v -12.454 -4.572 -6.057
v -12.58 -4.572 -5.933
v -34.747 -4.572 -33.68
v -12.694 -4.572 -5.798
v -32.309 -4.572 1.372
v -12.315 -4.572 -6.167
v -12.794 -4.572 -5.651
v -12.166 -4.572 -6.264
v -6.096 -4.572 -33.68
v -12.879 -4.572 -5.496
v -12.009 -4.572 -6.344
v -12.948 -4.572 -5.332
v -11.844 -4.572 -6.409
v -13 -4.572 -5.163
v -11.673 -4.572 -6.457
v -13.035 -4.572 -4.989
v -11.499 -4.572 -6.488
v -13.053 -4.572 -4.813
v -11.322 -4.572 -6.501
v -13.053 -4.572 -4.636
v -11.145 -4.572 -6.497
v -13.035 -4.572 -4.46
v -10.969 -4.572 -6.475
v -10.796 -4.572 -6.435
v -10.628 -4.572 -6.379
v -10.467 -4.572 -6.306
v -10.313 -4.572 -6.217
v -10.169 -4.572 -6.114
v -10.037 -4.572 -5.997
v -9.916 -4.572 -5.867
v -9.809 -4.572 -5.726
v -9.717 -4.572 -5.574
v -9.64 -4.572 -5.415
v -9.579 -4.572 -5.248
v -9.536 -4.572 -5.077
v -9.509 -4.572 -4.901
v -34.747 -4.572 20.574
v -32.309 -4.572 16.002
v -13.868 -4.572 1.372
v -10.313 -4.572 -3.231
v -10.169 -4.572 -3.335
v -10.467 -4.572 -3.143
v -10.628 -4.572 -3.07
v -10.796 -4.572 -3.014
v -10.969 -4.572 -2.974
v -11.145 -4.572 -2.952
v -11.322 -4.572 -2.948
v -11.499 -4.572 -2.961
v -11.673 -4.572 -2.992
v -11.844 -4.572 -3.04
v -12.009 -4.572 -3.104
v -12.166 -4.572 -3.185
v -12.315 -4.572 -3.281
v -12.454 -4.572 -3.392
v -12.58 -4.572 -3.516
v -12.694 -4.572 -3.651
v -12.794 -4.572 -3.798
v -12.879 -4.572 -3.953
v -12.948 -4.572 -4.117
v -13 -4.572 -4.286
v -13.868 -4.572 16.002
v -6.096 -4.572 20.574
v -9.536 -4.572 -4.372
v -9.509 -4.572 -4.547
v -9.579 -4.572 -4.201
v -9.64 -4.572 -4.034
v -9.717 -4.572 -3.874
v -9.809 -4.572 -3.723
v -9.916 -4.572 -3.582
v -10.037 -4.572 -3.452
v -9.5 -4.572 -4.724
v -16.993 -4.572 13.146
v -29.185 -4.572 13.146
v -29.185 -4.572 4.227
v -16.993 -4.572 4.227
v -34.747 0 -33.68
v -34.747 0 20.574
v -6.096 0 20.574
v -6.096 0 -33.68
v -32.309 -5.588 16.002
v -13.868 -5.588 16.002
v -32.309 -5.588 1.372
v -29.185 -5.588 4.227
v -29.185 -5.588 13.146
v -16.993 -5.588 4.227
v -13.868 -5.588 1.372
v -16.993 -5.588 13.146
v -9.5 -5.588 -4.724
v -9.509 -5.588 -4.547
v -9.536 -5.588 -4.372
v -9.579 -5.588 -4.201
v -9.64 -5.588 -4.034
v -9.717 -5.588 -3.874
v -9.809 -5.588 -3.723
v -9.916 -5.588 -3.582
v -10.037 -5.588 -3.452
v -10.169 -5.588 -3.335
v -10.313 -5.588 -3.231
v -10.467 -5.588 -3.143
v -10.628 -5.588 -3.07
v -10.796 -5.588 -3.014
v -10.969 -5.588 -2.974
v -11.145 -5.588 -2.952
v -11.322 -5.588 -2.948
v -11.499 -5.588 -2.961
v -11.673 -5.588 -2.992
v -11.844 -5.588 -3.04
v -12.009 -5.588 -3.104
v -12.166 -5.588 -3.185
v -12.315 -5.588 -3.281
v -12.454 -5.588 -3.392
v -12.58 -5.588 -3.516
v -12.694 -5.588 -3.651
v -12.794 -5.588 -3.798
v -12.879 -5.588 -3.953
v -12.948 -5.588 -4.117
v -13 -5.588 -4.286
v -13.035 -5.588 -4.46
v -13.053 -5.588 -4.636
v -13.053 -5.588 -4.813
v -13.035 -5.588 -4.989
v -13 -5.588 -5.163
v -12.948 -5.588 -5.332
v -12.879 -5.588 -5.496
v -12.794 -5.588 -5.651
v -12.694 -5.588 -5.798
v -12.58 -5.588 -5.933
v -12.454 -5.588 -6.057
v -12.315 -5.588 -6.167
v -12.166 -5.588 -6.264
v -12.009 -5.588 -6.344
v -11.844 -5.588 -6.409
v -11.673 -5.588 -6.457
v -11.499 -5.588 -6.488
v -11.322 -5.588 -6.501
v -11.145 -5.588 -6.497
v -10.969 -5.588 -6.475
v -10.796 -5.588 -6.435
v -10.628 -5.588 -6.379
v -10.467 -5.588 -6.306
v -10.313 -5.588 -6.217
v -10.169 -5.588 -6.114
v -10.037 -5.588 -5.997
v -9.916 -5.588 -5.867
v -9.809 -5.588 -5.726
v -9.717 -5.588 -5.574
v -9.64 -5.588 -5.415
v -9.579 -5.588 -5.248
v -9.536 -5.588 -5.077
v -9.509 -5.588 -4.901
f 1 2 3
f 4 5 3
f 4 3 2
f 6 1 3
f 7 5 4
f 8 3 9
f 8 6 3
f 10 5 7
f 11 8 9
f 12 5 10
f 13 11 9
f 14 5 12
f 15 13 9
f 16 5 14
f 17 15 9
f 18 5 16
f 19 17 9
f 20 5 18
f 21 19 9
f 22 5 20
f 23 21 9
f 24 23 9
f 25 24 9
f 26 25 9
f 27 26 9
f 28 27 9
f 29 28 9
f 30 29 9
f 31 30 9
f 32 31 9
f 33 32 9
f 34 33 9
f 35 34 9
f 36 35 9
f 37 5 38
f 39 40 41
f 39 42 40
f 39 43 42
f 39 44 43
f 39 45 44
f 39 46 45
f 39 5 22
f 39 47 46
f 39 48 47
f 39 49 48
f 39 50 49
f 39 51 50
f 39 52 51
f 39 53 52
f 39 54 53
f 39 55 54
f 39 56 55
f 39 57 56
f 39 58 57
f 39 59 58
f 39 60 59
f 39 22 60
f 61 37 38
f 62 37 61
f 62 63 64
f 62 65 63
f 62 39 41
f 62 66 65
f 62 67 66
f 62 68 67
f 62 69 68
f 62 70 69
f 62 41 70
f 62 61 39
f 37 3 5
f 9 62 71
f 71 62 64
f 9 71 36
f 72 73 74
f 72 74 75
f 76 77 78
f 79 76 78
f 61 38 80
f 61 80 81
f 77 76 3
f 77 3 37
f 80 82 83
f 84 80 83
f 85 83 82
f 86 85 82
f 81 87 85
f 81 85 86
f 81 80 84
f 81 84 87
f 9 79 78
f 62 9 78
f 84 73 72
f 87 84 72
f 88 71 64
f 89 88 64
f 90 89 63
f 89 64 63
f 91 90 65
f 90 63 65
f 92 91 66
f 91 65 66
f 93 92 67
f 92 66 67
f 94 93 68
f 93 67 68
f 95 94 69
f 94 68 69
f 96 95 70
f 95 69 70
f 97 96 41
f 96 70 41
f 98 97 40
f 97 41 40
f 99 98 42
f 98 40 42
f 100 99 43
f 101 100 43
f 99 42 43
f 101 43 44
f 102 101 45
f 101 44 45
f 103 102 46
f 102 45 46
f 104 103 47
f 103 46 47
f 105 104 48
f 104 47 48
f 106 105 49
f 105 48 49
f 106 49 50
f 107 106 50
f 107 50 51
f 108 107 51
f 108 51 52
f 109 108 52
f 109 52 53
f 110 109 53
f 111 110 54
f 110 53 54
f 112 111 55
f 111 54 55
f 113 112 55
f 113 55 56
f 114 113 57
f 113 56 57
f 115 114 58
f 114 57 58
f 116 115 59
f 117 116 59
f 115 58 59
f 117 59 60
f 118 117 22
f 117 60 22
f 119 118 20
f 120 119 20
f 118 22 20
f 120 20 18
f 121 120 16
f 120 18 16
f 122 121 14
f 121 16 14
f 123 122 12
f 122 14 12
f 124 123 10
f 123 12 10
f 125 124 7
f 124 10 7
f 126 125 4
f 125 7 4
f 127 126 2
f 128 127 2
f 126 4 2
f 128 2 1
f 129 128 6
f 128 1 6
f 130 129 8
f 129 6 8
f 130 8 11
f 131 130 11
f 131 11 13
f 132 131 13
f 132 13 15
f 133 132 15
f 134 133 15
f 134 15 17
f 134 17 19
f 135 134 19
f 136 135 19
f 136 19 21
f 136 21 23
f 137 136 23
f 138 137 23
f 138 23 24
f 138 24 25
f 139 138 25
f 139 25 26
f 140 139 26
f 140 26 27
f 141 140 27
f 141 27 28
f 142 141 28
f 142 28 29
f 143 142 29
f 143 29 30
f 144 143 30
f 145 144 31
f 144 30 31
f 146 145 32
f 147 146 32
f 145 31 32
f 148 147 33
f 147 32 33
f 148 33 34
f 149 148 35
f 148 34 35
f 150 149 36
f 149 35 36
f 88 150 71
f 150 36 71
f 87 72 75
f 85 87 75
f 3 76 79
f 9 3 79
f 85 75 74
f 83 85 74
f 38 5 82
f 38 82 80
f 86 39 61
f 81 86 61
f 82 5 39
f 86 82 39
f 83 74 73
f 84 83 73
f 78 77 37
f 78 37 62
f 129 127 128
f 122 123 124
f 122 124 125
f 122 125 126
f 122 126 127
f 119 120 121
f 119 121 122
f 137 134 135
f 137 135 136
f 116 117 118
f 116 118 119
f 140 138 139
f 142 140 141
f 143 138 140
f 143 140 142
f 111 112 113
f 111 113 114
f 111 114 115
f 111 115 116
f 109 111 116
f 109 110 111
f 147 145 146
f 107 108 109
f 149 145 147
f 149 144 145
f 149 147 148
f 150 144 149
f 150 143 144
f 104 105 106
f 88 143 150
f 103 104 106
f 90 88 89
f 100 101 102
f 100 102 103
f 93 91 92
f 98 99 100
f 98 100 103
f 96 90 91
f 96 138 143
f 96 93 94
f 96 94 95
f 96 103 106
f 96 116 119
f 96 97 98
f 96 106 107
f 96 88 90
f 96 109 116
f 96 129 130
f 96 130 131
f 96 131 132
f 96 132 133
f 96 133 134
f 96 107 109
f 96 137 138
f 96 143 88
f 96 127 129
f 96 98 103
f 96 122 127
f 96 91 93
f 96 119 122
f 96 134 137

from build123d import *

# Parameters (mm, degrees)
F0_W     = 28.651202
F0_H     = 54.254404
F1_DEPTH = 4.572
F2_R     = 1.777274
F2_W     = 18.440403
F2_H     = 14.630441
F3_DEPTH = 1.016


with BuildPart() as f1:
    # F0 (on Front) → F1 (new body)
    with BuildSketch(Plane.XZ):
        with Locations((-20.421601, -6.5532)):
            Rectangle(F0_W, F0_H)
    extrude(amount=F1_DEPTH)

    # F2 (on face) → F3 (join)
    with BuildSketch(Plane.XZ.offset(4.572)):
        with Locations((-11.2776, -4.7244)):
            Circle(F2_R)
        with Locations((-23.0886, 8.68678)):
            Rectangle(F2_W, F2_H)
        Polygon((-29.184598, 8.68678), (-29.184598, 13.146272), (-23.0886, 13.146272), (-16.992602, 13.146272), (-16.992602, 8.68678), (-16.992602, 4.227289), (-23.0886, 4.227289), (-29.184598, 4.227289), align=None, mode=Mode.SUBTRACT)
    extrude(amount=F3_DEPTH)


solid = f1.part
